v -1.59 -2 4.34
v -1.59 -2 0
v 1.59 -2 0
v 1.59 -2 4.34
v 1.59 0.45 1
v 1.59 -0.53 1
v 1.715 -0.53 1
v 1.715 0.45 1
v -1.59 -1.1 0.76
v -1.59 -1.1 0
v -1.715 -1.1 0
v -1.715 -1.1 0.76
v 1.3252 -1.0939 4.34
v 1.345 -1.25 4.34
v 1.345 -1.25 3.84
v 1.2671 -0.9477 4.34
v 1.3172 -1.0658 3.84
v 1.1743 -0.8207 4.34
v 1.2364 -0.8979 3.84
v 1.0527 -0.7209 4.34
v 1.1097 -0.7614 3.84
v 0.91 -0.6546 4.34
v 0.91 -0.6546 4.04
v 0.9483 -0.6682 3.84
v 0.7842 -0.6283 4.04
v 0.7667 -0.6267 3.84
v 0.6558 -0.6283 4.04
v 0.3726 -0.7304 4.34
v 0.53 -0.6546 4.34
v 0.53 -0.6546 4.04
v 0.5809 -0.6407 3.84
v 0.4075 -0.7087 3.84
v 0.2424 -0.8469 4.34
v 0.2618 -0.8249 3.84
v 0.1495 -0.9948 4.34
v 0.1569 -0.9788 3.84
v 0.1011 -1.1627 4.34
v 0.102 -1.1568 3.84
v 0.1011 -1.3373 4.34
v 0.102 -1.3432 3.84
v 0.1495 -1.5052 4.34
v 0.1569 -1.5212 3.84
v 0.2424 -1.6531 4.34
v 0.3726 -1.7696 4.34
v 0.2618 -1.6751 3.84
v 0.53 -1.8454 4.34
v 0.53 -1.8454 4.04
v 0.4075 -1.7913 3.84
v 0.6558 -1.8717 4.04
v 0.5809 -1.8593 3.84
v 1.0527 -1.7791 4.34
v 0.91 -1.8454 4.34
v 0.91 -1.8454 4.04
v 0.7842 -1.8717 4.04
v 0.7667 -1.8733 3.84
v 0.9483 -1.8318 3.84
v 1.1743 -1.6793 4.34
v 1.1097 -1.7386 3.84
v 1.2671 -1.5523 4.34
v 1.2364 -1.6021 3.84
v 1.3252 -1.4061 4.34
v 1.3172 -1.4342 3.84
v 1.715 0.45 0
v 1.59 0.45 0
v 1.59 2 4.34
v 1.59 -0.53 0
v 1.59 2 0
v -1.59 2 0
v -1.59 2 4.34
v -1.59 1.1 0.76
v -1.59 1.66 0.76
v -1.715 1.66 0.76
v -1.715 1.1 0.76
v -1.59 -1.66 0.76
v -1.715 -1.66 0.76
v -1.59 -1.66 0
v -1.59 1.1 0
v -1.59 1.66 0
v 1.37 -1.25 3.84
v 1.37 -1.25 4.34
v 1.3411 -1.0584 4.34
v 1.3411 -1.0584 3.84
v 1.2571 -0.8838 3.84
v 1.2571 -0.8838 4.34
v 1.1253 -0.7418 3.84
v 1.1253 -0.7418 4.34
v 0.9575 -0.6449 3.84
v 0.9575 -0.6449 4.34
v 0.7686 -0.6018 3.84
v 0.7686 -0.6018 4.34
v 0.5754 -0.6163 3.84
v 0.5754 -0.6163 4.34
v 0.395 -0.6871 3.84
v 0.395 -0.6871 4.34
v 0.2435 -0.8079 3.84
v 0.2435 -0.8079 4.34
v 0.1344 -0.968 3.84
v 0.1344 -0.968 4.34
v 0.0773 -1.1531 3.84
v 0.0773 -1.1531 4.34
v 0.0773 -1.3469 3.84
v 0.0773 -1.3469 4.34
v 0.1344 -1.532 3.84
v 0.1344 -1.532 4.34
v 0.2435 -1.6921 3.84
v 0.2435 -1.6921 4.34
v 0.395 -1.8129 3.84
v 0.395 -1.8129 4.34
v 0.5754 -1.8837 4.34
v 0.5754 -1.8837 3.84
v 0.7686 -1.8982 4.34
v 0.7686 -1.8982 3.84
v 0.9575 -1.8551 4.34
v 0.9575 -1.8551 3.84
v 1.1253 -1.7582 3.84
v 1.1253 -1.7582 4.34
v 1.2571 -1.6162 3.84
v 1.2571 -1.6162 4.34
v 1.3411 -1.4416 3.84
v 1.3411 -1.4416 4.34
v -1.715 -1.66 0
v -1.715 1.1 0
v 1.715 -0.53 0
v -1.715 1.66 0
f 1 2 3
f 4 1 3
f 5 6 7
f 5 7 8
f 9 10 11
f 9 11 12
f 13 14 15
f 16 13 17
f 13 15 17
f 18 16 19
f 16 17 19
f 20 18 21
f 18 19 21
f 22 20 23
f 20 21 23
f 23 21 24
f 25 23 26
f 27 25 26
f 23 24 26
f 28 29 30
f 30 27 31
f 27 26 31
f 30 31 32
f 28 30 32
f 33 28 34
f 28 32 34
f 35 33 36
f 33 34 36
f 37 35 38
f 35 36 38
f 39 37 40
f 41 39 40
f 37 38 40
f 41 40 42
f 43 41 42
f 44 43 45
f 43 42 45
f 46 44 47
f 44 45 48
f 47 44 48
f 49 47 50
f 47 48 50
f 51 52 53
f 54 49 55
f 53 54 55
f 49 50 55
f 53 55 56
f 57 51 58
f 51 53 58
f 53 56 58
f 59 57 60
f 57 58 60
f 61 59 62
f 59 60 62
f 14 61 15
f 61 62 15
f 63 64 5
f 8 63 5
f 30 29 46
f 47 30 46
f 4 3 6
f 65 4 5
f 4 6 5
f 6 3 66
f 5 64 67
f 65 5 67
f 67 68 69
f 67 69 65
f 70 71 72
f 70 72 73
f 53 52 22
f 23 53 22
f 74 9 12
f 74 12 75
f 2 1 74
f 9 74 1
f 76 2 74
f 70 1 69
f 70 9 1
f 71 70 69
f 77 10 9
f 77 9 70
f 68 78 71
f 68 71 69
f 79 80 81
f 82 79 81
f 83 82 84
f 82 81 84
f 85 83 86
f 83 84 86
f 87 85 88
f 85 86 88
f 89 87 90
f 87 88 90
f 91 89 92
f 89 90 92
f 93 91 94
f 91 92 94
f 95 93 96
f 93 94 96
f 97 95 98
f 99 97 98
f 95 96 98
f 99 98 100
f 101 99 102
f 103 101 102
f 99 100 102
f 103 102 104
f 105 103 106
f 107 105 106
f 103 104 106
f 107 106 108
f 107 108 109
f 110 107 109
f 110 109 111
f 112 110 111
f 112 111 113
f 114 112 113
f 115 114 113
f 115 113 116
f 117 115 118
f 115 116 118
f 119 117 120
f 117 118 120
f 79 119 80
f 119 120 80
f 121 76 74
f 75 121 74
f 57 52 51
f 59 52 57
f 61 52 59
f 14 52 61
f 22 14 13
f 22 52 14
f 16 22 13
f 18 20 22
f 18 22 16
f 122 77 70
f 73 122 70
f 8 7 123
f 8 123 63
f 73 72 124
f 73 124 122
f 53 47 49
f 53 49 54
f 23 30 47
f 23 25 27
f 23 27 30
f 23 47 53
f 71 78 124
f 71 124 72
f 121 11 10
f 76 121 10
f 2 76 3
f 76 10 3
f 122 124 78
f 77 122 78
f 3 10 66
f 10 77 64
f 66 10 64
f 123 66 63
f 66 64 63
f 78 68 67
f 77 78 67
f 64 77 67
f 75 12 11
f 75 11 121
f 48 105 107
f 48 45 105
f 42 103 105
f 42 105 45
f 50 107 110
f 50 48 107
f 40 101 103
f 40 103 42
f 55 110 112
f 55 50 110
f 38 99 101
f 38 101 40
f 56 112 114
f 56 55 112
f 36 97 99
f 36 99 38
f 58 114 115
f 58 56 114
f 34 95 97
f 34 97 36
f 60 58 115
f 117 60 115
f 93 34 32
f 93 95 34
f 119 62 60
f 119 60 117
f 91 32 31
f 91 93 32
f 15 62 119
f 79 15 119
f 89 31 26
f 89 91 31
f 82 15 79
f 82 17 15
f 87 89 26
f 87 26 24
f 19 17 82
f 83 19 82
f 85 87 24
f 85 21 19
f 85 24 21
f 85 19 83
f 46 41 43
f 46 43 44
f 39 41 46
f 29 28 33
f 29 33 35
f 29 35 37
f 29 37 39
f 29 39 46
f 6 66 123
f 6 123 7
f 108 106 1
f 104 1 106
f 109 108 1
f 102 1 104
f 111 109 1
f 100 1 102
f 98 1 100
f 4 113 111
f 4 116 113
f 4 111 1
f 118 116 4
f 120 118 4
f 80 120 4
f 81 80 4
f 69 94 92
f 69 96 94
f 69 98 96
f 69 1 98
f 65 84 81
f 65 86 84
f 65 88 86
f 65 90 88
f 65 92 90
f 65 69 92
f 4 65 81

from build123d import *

# Parameters (mm, degrees)
SKETCH_W        = 3.18
SKETCH_H        = 4
PAD_DEPTH       = 4.34
SKETCH001_W     = 0.98
SKETCH001_H     = 1
PAD001_DEPTH    = 0.125
SKETCH002_W     = 0.56
SKETCH002_H     = 0.76
PAD002_DEPTH    = 0.125
SKETCH003_R     = 0.65
POCKET_DEPTH    = 0.5
SKETCH004_R     = 0.625
PAD003_DEPTH    = 0.5
POCKET001_DEPTH = 0.3


with BuildPart() as part:
    # Sketch → Pad (new body)
    with BuildSketch(Plane.XY):
        Rectangle(SKETCH_W, SKETCH_H)
    extrude(amount=PAD_DEPTH)

    # Sketch001 (on Face3 of Pad) → Pad001 (join)
    with BuildSketch(Plane.YZ.offset(1.59)):
        with Locations((-0.04, 0.5)):
            Rectangle(SKETCH001_W, SKETCH001_H)
    extrude(amount=PAD001_DEPTH)

    # Sketch002 (on Face1 of Pad001) → Pad002 (join)
    with BuildSketch(Plane(origin=(-1.59, 0, 0), x_dir=(0, -1, 0), z_dir=(-1, 0, 0))):
        with Locations((-1.38, 0.38)):
            Rectangle(SKETCH002_W, SKETCH002_H)
        with Locations((1.38, 0.38)):
            Rectangle(SKETCH002_W, SKETCH002_H)
    extrude(amount=PAD002_DEPTH)

    # Sketch003 (on Face10 of Pad002) → Pocket (cut)
    with BuildSketch(Plane.XY.offset(4.34)):
        with Locations((0.72, -1.25)):
            Circle(SKETCH003_R)
    extrude(amount=-POCKET_DEPTH, mode=Mode.SUBTRACT)

    # Sketch004 (on Face23 of Pocket) → Pad003 (join)
    with BuildSketch(Plane.XY.offset(3.84)):
        with Locations((0.72, -1.25)):
            Circle(SKETCH004_R)
    extrude(amount=PAD003_DEPTH)

    # Sketch005 (on Face25 of Pad003) → Pocket001 (cut)
    with BuildSketch(Plane.XY.offset(4.34)):
        with BuildLine():
            Line((0.53, -0.65458), (0.53, -1.84542))
            ThreePointArc((0.53, -1.84542), (0.72, -1.875), (0.91, -1.84542))
            Line((0.91, -1.84542), (0.91, -0.65458))
            ThreePointArc((0.91, -0.65458), (0.72, -0.625), (0.53, -0.65458))
        make_face()
    extrude(amount=-POCKET001_DEPTH, mode=Mode.SUBTRACT)


solid = part.part
